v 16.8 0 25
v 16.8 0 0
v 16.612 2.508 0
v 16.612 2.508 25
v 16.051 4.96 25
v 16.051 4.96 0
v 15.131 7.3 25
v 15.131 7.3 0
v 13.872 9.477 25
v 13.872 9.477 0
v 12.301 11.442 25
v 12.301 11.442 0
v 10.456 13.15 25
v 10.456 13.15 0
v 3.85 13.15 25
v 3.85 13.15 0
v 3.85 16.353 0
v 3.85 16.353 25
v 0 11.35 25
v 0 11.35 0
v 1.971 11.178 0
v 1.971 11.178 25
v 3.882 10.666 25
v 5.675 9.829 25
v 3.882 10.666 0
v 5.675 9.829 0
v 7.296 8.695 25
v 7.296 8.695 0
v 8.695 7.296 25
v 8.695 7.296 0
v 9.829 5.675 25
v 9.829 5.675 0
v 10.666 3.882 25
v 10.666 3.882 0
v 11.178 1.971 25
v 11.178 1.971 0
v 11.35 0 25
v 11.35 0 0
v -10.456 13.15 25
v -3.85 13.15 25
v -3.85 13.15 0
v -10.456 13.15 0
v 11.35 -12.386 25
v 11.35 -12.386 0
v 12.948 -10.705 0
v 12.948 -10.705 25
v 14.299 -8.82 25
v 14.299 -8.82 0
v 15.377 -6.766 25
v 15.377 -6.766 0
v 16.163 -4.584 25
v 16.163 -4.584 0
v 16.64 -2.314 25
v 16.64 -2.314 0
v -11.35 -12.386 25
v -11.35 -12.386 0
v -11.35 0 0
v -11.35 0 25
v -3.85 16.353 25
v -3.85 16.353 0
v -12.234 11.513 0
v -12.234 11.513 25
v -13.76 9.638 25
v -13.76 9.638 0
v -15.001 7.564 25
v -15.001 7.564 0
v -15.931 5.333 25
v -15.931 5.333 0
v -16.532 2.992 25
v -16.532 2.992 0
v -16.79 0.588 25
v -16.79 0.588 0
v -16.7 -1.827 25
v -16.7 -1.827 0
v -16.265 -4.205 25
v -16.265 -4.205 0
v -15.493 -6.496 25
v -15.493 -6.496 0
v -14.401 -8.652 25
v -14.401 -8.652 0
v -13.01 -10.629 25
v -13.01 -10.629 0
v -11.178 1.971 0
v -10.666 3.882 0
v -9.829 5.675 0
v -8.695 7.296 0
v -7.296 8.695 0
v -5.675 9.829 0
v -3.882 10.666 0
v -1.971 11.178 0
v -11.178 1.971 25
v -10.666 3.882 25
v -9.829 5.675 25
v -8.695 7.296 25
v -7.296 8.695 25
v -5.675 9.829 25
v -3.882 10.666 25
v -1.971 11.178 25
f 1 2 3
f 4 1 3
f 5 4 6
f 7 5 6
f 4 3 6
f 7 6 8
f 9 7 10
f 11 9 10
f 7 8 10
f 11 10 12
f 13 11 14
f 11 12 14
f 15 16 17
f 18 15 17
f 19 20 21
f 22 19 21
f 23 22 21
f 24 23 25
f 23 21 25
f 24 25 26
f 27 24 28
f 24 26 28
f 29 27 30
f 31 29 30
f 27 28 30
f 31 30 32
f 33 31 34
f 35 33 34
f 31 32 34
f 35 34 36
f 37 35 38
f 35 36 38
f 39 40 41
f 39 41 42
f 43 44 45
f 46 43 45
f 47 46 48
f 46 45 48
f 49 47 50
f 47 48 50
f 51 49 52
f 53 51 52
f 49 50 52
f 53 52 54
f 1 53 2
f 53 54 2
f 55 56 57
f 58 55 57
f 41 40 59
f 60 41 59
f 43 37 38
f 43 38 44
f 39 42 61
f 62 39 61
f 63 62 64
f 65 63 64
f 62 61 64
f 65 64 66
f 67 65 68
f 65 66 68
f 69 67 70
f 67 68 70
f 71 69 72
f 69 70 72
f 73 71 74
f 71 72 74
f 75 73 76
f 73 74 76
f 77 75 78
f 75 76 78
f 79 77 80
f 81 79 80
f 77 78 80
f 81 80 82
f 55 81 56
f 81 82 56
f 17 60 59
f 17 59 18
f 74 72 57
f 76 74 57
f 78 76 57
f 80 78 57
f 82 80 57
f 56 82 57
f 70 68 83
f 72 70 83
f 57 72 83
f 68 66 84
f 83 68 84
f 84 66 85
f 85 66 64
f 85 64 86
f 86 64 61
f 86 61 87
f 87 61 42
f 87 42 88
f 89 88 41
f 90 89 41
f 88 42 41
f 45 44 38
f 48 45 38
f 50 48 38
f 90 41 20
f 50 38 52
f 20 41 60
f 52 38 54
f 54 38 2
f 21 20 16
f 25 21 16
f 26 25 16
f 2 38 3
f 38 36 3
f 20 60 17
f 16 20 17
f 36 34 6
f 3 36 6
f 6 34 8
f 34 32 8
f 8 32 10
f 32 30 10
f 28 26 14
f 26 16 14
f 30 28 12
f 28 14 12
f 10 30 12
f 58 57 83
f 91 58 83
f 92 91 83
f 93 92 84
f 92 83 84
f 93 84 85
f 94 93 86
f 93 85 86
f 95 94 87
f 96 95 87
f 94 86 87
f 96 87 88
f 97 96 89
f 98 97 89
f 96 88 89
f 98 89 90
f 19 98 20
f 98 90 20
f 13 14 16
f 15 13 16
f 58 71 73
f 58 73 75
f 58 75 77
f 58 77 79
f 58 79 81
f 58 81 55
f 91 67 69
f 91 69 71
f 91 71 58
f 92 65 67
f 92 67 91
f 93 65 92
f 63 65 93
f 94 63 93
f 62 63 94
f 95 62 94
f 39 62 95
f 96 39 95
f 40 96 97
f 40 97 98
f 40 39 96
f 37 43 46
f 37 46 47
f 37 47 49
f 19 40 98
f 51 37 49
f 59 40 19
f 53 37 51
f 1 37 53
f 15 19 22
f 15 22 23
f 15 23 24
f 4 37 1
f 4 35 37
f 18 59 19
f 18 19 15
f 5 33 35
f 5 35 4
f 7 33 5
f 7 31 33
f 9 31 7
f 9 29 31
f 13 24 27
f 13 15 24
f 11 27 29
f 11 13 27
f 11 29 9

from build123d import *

# Parameters (mm, degrees)
F0_W     = 3.85
F0_H     = 3.202905
F1_DEPTH = 25


with BuildPart() as f1:
    # F0 (on Top) → F1 (new body)
    with BuildSketch(Plane.XY):
        with BuildLine():
            Line((0, 11.35), (0, 13.15))
            Line((0, 13.15), (-3.85, 13.15))
            Line((-3.85, 13.15), (-10.455501, 13.15))
            ThreePointArc((-10.455501, 13.15), (-16.789703, 0.588121), (-11.35, -12.386182))
            Line((-11.35, -12.386182), (-11.35, 0))
            ThreePointArc((-11.35, 0), (-8.025662, 8.025662), (0, 11.35))
        make_face()
        with BuildLine():
            ThreePointArc((11.35, -12.386182), (15.377256, -6.766092), (16.8, 0))
            ThreePointArc((16.8, 0), (15.130969, 7.30026), (10.455501, 13.15))
            Line((10.455501, 13.15), (3.85, 13.15))
            Line((3.85, 13.15), (0, 13.15))
            Line((0, 13.15), (0, 11.35))
            ThreePointArc((0, 11.35), (8.025662, 8.025662), (11.35, 0))
            Line((11.35, 0), (11.35, -12.386182))
        make_face()
        with Locations((-1.925, 14.751452)):
            Rectangle(F0_W, F0_H)
        with Locations((1.925, 14.751452)):
            Rectangle(F0_W, F0_H)
    extrude(amount=F1_DEPTH)


solid = f1.part
